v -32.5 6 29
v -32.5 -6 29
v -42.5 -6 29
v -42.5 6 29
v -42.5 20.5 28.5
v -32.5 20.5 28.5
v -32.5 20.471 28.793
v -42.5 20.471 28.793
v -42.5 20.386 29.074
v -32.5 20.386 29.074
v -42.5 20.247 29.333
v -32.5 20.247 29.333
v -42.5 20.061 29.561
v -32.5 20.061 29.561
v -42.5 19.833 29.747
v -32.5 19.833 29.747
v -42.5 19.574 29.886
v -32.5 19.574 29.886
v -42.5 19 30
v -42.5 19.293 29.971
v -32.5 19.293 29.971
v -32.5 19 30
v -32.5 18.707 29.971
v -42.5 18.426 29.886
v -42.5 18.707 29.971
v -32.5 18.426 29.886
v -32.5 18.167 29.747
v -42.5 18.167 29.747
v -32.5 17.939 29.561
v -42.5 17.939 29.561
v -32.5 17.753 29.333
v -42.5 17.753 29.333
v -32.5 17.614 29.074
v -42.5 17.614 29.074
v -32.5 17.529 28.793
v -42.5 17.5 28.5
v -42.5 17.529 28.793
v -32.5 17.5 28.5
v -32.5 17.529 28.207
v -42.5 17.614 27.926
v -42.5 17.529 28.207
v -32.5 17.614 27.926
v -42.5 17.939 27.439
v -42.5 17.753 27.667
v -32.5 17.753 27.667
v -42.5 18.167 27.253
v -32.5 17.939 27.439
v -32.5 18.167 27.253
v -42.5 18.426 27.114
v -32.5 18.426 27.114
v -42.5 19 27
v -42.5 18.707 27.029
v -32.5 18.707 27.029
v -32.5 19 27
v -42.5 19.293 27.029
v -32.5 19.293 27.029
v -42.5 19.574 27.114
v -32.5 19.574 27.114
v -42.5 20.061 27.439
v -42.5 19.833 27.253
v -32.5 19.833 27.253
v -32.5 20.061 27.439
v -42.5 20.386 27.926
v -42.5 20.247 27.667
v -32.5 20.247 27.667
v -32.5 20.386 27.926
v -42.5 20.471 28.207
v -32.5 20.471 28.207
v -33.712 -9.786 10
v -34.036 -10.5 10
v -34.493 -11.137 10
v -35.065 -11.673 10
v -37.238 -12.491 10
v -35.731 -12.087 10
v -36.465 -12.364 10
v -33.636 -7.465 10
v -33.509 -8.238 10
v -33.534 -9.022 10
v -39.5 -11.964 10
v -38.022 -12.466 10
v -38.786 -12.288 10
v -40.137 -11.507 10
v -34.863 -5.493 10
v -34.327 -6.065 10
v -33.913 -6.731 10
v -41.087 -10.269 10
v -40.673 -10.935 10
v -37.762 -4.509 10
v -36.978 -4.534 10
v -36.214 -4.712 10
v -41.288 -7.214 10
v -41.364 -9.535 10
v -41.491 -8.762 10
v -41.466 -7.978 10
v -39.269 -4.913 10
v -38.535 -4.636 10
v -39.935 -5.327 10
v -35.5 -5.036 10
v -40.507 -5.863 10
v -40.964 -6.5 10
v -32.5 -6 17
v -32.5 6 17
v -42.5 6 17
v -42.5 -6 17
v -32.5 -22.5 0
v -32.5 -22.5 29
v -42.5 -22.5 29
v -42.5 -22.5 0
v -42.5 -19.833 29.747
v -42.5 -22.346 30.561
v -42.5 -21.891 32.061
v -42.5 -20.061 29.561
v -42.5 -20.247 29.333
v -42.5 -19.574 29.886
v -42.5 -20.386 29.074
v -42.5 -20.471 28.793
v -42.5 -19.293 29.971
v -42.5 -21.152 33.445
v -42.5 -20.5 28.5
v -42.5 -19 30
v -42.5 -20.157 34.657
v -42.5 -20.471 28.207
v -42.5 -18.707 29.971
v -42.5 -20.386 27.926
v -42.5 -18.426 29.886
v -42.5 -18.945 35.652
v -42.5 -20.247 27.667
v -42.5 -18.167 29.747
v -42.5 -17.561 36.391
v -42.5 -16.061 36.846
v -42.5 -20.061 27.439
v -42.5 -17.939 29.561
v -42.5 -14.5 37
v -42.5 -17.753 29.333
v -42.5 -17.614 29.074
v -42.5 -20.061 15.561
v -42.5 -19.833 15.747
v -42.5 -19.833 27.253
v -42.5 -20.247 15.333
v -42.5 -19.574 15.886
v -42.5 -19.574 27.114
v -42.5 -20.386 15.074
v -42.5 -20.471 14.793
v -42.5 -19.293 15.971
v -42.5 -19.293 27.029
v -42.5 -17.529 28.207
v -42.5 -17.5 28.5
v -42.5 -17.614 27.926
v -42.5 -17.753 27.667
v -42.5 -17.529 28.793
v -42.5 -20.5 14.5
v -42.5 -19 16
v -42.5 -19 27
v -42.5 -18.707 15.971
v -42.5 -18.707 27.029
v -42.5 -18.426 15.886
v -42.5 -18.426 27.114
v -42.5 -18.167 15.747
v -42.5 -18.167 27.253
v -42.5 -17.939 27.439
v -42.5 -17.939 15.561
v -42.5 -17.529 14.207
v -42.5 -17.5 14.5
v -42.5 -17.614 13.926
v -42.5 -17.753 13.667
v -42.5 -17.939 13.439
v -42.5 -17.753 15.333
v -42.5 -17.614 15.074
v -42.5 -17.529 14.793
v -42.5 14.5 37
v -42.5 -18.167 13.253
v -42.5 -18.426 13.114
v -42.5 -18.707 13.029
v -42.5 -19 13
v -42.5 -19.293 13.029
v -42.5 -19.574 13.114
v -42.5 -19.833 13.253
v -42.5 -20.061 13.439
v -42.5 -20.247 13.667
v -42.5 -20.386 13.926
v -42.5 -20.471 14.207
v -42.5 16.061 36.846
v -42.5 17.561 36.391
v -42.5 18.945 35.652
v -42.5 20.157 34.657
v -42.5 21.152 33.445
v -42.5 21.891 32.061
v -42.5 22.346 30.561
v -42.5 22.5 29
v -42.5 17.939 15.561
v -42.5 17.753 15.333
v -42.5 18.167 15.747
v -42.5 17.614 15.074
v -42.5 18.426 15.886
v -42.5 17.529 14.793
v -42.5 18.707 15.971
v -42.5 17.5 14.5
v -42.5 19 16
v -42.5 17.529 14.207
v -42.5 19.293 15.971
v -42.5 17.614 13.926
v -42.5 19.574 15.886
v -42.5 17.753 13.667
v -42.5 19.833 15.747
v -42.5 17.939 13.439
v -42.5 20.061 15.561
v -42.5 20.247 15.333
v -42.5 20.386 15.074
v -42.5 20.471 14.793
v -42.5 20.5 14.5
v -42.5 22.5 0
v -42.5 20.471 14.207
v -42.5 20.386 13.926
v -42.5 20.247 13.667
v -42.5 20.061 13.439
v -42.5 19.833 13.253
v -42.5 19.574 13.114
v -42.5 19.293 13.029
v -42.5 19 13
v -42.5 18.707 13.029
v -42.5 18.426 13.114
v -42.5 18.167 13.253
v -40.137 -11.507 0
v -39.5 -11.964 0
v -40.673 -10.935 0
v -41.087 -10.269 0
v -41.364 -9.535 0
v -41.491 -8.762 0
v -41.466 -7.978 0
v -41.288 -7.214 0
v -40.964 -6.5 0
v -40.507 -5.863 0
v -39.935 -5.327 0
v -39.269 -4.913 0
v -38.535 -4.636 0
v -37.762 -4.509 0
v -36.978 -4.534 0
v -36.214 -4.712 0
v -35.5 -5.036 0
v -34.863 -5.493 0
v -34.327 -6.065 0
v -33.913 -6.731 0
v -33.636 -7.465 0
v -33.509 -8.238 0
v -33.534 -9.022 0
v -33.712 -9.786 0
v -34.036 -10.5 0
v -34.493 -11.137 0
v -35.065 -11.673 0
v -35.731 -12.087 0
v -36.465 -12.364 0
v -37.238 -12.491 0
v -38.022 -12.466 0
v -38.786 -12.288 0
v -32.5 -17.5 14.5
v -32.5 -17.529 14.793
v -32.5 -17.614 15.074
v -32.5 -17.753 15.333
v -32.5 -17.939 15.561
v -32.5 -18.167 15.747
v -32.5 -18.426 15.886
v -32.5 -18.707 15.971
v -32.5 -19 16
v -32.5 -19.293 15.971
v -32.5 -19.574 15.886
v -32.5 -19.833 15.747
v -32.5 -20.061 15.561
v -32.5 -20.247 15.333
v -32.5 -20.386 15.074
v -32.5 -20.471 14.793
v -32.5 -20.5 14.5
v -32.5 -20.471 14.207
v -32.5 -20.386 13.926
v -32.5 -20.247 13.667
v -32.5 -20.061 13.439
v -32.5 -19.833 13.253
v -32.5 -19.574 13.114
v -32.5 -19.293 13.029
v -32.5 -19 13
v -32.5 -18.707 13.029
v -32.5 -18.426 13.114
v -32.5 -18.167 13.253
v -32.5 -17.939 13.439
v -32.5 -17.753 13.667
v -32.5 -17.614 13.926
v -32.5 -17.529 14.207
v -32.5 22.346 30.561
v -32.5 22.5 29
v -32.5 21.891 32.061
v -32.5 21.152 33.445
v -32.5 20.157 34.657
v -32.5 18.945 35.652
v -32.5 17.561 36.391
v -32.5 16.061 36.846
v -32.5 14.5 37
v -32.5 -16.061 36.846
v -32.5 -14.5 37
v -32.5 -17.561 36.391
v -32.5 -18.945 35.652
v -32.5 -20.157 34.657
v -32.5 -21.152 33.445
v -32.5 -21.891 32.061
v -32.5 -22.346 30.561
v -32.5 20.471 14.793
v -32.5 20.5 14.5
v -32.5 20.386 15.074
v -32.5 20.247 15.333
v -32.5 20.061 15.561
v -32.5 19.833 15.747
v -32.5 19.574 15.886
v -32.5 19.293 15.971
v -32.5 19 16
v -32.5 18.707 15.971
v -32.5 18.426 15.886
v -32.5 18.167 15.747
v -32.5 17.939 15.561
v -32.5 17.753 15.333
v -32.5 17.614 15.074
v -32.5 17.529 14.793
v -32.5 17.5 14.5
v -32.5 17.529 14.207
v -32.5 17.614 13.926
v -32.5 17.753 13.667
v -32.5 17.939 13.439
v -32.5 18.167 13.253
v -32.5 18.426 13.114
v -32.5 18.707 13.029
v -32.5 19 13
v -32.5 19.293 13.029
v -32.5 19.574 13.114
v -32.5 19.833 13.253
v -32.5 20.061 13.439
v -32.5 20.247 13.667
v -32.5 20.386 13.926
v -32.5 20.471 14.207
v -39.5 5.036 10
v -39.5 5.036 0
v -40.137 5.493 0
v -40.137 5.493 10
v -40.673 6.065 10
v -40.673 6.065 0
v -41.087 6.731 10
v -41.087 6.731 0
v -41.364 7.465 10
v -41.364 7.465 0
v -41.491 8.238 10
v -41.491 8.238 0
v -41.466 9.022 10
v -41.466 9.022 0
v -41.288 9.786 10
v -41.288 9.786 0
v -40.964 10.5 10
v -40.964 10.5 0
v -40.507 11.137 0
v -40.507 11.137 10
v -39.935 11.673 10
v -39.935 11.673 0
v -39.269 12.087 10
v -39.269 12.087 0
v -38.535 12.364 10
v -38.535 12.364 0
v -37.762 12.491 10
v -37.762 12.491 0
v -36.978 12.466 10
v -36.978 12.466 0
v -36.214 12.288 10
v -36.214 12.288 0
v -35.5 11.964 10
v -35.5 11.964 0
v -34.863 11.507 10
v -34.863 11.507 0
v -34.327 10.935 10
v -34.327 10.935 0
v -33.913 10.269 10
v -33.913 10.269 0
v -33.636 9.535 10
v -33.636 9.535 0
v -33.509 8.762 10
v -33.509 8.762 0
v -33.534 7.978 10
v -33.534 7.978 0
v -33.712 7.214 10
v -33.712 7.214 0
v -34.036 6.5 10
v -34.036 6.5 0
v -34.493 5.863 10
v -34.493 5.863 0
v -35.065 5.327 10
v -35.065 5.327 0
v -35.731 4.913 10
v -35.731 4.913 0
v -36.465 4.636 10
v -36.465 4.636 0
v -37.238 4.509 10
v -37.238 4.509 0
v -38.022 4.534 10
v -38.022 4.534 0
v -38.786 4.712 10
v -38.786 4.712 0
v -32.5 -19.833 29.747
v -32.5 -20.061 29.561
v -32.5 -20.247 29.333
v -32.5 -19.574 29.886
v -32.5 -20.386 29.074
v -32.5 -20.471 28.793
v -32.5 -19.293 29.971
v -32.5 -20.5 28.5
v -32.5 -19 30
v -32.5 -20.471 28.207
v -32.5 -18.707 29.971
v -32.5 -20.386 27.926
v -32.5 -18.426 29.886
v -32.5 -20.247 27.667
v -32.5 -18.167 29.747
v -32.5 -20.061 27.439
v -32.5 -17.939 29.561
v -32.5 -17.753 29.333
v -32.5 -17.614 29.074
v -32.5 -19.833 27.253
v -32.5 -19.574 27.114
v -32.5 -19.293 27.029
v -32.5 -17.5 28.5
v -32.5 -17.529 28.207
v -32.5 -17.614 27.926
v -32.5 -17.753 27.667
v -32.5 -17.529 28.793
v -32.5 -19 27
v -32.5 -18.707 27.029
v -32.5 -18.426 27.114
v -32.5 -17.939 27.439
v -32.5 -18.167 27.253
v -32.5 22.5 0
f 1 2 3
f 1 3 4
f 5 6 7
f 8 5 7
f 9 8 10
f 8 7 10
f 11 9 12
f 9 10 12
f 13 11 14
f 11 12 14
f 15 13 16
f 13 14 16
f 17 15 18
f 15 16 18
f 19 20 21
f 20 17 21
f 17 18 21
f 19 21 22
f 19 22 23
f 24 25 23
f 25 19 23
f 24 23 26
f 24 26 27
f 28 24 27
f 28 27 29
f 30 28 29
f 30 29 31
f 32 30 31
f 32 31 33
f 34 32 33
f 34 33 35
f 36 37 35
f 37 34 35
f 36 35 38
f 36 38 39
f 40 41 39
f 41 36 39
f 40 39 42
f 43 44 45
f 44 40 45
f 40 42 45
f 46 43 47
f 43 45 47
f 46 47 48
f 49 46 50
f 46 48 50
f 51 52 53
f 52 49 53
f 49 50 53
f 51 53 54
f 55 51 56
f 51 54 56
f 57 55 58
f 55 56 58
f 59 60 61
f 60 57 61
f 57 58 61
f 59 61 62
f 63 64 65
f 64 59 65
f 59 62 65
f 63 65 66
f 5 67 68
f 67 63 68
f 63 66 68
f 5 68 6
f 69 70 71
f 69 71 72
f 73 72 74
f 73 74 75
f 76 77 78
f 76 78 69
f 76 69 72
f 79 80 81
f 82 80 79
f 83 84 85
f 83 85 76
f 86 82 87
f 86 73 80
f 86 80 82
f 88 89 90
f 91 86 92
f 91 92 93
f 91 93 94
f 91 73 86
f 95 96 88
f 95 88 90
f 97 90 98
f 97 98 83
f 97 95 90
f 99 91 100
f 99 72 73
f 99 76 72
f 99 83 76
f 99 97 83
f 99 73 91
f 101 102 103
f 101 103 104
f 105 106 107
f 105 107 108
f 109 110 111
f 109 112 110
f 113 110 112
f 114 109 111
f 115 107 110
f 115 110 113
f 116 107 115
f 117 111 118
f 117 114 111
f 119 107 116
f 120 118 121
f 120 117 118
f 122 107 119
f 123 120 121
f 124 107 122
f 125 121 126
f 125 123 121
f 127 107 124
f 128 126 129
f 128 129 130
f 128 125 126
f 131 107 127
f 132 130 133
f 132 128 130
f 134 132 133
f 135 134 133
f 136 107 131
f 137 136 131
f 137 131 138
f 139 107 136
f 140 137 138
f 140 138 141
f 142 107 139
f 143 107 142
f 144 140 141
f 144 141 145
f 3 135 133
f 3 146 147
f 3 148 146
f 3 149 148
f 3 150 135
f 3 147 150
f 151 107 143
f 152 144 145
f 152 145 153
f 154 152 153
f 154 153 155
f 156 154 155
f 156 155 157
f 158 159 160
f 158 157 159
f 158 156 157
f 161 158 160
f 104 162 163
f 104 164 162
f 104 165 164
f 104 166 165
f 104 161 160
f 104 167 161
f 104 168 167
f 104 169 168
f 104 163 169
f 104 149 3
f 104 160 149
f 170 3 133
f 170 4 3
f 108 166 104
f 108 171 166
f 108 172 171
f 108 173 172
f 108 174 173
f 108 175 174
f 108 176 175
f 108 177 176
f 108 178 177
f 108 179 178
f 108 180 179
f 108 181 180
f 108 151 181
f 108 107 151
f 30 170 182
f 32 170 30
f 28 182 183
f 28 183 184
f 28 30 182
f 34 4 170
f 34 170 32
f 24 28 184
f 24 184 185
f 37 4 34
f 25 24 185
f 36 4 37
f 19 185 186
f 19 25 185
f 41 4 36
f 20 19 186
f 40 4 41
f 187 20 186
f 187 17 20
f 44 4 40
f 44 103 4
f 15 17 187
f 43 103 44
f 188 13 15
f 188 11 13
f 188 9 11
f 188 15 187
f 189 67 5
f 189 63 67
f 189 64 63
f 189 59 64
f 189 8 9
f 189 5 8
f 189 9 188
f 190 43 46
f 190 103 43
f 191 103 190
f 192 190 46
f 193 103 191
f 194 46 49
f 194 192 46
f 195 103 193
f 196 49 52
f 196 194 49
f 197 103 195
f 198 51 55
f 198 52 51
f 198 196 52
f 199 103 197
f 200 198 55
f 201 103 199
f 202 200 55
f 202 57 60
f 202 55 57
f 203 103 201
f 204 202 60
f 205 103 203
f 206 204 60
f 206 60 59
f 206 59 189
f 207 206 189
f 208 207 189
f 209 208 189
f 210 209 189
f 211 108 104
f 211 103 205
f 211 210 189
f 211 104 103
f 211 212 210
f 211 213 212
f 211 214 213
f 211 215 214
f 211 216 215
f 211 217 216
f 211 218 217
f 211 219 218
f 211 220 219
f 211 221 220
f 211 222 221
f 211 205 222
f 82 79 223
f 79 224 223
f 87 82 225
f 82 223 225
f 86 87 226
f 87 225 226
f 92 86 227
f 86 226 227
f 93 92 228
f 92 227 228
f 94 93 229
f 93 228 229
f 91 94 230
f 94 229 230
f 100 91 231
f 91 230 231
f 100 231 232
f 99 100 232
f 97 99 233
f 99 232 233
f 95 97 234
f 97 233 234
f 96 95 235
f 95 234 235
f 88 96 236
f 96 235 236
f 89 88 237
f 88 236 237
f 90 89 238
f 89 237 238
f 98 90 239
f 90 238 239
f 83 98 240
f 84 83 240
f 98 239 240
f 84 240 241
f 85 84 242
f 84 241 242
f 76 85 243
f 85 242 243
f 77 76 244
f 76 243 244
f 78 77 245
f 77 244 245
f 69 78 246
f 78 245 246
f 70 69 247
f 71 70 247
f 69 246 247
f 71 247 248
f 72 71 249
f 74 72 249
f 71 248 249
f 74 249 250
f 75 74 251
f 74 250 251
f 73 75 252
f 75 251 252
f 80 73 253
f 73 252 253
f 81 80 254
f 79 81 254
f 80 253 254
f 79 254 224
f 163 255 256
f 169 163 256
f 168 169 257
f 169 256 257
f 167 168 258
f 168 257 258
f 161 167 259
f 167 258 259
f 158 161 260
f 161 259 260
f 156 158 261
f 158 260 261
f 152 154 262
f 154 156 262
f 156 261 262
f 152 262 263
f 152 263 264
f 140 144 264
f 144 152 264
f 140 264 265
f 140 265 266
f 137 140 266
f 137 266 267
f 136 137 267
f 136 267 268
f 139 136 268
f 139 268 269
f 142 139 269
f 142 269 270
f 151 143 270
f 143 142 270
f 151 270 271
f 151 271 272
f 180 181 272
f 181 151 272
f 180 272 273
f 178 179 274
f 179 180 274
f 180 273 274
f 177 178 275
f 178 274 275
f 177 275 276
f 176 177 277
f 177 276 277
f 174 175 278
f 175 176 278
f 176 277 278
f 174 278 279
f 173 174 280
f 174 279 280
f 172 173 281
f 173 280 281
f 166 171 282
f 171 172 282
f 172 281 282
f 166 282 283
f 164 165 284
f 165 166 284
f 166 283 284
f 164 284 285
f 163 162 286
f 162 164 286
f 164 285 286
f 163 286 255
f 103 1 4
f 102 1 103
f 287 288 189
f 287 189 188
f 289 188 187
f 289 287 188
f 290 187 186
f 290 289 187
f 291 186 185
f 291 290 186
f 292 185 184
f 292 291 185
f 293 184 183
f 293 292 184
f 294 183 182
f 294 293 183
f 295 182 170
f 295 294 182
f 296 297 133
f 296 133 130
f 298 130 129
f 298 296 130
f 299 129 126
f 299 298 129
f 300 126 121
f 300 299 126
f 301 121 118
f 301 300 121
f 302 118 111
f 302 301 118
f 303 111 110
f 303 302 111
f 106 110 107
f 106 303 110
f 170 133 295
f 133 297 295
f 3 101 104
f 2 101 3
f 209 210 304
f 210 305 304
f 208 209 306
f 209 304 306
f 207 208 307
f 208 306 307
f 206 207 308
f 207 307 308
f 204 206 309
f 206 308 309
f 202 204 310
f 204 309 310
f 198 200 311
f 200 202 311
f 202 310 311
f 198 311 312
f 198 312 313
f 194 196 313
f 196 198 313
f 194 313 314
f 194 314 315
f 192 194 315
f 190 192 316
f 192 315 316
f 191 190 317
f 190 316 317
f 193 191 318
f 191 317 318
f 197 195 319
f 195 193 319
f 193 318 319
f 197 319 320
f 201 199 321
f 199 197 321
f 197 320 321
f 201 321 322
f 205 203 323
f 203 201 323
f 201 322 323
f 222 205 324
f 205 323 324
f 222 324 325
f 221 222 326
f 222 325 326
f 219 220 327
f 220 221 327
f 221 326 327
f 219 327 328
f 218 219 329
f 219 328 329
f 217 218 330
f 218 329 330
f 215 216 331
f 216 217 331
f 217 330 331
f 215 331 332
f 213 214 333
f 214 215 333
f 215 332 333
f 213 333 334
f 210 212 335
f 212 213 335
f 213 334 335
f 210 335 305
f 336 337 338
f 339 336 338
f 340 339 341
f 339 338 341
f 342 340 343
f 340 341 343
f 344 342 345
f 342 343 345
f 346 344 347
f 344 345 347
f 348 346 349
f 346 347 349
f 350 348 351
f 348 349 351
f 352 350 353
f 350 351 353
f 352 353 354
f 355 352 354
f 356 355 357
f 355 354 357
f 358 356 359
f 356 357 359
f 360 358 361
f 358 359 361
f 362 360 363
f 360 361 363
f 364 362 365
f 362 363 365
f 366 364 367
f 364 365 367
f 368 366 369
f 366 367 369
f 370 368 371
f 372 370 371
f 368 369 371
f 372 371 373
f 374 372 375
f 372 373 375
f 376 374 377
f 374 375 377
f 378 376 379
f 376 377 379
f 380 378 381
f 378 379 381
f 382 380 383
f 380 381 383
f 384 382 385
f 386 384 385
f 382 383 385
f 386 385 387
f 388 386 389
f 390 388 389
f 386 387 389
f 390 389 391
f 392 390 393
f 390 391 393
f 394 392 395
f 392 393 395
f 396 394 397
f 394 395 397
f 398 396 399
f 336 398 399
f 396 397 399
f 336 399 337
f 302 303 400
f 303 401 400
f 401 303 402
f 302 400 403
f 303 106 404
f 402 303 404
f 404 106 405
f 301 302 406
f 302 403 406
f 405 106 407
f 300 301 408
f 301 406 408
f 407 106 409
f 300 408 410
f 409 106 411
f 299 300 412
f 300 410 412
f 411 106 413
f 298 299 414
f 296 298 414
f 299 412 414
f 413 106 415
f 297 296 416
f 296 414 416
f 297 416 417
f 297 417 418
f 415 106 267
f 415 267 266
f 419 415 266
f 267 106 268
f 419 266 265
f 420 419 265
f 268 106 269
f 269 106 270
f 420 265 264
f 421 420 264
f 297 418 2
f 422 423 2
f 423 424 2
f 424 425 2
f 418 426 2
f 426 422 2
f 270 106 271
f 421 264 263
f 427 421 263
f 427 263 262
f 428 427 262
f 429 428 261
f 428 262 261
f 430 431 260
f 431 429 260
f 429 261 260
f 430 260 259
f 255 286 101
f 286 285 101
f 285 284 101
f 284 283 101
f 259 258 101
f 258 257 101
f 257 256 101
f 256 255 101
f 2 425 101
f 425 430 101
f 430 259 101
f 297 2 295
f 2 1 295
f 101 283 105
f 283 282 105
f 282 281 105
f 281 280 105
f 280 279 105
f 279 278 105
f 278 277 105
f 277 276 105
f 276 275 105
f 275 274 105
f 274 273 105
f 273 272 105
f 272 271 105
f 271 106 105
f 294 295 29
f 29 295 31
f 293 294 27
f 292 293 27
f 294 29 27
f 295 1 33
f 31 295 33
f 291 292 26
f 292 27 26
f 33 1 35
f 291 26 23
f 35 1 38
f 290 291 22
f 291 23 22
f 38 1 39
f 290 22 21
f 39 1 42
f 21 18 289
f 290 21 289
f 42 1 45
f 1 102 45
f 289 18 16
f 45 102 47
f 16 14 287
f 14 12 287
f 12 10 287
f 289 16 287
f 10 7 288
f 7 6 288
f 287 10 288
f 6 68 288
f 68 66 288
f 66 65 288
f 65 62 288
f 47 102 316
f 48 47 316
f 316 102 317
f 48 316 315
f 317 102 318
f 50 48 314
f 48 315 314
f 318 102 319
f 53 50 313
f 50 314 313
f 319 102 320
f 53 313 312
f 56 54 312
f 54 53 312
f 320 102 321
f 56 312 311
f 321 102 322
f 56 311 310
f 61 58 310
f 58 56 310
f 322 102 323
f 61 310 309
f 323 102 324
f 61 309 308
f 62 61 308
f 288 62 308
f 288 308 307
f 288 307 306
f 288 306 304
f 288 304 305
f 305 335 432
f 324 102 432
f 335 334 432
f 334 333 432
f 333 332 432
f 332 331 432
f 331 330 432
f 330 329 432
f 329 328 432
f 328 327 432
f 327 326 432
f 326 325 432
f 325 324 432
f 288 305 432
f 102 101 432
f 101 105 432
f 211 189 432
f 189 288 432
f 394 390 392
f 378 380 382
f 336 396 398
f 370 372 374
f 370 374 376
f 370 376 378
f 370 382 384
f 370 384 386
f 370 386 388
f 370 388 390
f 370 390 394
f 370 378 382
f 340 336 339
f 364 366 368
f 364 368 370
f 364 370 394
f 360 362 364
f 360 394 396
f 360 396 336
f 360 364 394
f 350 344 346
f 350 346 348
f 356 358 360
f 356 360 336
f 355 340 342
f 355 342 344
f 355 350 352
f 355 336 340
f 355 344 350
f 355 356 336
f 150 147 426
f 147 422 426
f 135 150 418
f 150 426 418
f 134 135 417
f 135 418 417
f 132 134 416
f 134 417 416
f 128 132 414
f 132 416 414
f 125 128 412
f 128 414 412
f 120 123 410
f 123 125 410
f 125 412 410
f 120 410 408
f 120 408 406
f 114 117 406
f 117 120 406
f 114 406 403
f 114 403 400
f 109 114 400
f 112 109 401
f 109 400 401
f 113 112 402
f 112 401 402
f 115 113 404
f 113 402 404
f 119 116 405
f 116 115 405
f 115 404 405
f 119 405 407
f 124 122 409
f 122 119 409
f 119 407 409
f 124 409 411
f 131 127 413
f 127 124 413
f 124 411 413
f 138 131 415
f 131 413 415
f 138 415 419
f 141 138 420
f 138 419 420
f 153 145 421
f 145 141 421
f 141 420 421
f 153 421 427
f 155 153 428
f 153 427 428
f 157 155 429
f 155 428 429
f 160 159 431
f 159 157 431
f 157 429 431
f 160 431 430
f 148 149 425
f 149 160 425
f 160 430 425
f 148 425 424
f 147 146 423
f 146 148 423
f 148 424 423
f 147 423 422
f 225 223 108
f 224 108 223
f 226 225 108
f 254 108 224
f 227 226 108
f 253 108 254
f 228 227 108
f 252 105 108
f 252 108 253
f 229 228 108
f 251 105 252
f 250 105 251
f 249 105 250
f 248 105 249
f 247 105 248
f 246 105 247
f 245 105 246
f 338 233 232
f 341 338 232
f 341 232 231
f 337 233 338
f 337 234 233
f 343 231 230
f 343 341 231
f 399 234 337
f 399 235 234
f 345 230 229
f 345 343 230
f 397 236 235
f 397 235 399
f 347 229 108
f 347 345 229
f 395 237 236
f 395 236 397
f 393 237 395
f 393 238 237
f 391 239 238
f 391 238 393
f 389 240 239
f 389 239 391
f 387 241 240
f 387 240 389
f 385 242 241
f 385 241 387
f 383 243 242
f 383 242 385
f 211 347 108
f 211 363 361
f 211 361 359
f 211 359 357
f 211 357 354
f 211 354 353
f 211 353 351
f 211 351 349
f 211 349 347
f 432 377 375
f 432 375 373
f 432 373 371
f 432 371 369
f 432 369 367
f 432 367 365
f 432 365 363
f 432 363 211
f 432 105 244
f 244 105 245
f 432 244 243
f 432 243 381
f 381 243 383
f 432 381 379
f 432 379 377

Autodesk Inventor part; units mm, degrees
ref_plane "YZ Plane" through (0, 0, 0) normal (1, 0, 0) x (0, 1, 0)
ref_plane "XZ Plane" through (0, 0, 0) normal (0, 1, 0) x (-1, 0, 0)
ref_plane "XY Plane" through (0, 0, 0) normal (0, 0, 1) x (1, 0, 0)
ref_plane "РабПлоскость1" through (-32.5, 0, 7) normal (-1, 0, 0) x (0, 1, 0)
sketch "Эскиз1" plane through (-32.5, 0, 7) normal (-1, 0, 0) x (0, 1, 0)
  line L0 (15, -5) -> (15, -24) projected
  arc A0 (15, -5) -> (15, 5) centre (15, 0) ccw projected
  line L1 (15, -24) -> (-15, -24) projected
  arc A1 (14.5, -30) -> (22.5, -22) centre (14.5, -22) ccw projected
  line L2 (-14.5, -30) -> (14.5, -30) projected
  arc A2 (-22.5, -22) -> (-14.5, -30) centre (-14.5, -22) ccw projected
  circle A3 centre (-19, -21.5) radius 1.5 projected
  circle A4 centre (-19, -7.5) radius 1.5 projected
  circle A5 centre (19, -21.5) radius 1.5 projected
  circle A6 centre (19, -7.5) radius 1.5 projected
  line L3 (-15, -24) -> (-15, 24) construction
  line L4 (-22.5, 24) -> (-22.5, -22) construction
  line L5 (22.5, -22) -> (22.5, 24) construction
  line L6 (15, 24) -> (15, 5) construction
  line L7 (22.5, -22) -> (22.5, 7)
  line L8 (14, 7) -> (-14, 7) projected
  line L9 (14, 7) -> (22.5, 7)
  line L10 (-14, 7) -> (-15, 7)
  line L11 (-15, 7) -> (-15, -24)
  line L12 (-22.5, -22) -> (-22.5, 7)
  line L13 (-22.5, 7) -> (-15, 7)
  line L14 (15, 5) -> (15, 7)
  line L15 (-6, -22) -> (6, -22)
  line L16 (6, -22) -> (6, -10)
  line L17 (6, -10) -> (-6, -10)
  line L18 (-6, -10) -> (-6, -22)
  point P0 (0, 7)
  point P1 (0, -10)
  dimension "d0" = 2
  dimension "d1" = 12
  dimension "d2" = 12
extrude "Выдавливание1" add sketch "Эскиз1" along normal blind 10
sketch "Эскиз2" plane through (-32.5, -22.5, 0) normal (0, 0, -1) x (-1, 0, 0)
  arc A0 (7, 34.4641) -> (7, 27.5359) centre (5, 31) ccw projected
  arc A1 (7, 17.4641) -> (7, 10.5359) centre (5, 14) ccw projected
  arc A2 (7, 27.5359) -> (7, 34.4641) centre (5, 31) ccw
  arc A3 (7, 10.5359) -> (7, 17.4641) centre (5, 14) ccw
  point P0 (-32.5, 22.5)
extrude "Выдавливание2" cut sketch "Эскиз2" against normal blind 10
equation "\"d2\" = d1"
properties part number "upper_cup"
